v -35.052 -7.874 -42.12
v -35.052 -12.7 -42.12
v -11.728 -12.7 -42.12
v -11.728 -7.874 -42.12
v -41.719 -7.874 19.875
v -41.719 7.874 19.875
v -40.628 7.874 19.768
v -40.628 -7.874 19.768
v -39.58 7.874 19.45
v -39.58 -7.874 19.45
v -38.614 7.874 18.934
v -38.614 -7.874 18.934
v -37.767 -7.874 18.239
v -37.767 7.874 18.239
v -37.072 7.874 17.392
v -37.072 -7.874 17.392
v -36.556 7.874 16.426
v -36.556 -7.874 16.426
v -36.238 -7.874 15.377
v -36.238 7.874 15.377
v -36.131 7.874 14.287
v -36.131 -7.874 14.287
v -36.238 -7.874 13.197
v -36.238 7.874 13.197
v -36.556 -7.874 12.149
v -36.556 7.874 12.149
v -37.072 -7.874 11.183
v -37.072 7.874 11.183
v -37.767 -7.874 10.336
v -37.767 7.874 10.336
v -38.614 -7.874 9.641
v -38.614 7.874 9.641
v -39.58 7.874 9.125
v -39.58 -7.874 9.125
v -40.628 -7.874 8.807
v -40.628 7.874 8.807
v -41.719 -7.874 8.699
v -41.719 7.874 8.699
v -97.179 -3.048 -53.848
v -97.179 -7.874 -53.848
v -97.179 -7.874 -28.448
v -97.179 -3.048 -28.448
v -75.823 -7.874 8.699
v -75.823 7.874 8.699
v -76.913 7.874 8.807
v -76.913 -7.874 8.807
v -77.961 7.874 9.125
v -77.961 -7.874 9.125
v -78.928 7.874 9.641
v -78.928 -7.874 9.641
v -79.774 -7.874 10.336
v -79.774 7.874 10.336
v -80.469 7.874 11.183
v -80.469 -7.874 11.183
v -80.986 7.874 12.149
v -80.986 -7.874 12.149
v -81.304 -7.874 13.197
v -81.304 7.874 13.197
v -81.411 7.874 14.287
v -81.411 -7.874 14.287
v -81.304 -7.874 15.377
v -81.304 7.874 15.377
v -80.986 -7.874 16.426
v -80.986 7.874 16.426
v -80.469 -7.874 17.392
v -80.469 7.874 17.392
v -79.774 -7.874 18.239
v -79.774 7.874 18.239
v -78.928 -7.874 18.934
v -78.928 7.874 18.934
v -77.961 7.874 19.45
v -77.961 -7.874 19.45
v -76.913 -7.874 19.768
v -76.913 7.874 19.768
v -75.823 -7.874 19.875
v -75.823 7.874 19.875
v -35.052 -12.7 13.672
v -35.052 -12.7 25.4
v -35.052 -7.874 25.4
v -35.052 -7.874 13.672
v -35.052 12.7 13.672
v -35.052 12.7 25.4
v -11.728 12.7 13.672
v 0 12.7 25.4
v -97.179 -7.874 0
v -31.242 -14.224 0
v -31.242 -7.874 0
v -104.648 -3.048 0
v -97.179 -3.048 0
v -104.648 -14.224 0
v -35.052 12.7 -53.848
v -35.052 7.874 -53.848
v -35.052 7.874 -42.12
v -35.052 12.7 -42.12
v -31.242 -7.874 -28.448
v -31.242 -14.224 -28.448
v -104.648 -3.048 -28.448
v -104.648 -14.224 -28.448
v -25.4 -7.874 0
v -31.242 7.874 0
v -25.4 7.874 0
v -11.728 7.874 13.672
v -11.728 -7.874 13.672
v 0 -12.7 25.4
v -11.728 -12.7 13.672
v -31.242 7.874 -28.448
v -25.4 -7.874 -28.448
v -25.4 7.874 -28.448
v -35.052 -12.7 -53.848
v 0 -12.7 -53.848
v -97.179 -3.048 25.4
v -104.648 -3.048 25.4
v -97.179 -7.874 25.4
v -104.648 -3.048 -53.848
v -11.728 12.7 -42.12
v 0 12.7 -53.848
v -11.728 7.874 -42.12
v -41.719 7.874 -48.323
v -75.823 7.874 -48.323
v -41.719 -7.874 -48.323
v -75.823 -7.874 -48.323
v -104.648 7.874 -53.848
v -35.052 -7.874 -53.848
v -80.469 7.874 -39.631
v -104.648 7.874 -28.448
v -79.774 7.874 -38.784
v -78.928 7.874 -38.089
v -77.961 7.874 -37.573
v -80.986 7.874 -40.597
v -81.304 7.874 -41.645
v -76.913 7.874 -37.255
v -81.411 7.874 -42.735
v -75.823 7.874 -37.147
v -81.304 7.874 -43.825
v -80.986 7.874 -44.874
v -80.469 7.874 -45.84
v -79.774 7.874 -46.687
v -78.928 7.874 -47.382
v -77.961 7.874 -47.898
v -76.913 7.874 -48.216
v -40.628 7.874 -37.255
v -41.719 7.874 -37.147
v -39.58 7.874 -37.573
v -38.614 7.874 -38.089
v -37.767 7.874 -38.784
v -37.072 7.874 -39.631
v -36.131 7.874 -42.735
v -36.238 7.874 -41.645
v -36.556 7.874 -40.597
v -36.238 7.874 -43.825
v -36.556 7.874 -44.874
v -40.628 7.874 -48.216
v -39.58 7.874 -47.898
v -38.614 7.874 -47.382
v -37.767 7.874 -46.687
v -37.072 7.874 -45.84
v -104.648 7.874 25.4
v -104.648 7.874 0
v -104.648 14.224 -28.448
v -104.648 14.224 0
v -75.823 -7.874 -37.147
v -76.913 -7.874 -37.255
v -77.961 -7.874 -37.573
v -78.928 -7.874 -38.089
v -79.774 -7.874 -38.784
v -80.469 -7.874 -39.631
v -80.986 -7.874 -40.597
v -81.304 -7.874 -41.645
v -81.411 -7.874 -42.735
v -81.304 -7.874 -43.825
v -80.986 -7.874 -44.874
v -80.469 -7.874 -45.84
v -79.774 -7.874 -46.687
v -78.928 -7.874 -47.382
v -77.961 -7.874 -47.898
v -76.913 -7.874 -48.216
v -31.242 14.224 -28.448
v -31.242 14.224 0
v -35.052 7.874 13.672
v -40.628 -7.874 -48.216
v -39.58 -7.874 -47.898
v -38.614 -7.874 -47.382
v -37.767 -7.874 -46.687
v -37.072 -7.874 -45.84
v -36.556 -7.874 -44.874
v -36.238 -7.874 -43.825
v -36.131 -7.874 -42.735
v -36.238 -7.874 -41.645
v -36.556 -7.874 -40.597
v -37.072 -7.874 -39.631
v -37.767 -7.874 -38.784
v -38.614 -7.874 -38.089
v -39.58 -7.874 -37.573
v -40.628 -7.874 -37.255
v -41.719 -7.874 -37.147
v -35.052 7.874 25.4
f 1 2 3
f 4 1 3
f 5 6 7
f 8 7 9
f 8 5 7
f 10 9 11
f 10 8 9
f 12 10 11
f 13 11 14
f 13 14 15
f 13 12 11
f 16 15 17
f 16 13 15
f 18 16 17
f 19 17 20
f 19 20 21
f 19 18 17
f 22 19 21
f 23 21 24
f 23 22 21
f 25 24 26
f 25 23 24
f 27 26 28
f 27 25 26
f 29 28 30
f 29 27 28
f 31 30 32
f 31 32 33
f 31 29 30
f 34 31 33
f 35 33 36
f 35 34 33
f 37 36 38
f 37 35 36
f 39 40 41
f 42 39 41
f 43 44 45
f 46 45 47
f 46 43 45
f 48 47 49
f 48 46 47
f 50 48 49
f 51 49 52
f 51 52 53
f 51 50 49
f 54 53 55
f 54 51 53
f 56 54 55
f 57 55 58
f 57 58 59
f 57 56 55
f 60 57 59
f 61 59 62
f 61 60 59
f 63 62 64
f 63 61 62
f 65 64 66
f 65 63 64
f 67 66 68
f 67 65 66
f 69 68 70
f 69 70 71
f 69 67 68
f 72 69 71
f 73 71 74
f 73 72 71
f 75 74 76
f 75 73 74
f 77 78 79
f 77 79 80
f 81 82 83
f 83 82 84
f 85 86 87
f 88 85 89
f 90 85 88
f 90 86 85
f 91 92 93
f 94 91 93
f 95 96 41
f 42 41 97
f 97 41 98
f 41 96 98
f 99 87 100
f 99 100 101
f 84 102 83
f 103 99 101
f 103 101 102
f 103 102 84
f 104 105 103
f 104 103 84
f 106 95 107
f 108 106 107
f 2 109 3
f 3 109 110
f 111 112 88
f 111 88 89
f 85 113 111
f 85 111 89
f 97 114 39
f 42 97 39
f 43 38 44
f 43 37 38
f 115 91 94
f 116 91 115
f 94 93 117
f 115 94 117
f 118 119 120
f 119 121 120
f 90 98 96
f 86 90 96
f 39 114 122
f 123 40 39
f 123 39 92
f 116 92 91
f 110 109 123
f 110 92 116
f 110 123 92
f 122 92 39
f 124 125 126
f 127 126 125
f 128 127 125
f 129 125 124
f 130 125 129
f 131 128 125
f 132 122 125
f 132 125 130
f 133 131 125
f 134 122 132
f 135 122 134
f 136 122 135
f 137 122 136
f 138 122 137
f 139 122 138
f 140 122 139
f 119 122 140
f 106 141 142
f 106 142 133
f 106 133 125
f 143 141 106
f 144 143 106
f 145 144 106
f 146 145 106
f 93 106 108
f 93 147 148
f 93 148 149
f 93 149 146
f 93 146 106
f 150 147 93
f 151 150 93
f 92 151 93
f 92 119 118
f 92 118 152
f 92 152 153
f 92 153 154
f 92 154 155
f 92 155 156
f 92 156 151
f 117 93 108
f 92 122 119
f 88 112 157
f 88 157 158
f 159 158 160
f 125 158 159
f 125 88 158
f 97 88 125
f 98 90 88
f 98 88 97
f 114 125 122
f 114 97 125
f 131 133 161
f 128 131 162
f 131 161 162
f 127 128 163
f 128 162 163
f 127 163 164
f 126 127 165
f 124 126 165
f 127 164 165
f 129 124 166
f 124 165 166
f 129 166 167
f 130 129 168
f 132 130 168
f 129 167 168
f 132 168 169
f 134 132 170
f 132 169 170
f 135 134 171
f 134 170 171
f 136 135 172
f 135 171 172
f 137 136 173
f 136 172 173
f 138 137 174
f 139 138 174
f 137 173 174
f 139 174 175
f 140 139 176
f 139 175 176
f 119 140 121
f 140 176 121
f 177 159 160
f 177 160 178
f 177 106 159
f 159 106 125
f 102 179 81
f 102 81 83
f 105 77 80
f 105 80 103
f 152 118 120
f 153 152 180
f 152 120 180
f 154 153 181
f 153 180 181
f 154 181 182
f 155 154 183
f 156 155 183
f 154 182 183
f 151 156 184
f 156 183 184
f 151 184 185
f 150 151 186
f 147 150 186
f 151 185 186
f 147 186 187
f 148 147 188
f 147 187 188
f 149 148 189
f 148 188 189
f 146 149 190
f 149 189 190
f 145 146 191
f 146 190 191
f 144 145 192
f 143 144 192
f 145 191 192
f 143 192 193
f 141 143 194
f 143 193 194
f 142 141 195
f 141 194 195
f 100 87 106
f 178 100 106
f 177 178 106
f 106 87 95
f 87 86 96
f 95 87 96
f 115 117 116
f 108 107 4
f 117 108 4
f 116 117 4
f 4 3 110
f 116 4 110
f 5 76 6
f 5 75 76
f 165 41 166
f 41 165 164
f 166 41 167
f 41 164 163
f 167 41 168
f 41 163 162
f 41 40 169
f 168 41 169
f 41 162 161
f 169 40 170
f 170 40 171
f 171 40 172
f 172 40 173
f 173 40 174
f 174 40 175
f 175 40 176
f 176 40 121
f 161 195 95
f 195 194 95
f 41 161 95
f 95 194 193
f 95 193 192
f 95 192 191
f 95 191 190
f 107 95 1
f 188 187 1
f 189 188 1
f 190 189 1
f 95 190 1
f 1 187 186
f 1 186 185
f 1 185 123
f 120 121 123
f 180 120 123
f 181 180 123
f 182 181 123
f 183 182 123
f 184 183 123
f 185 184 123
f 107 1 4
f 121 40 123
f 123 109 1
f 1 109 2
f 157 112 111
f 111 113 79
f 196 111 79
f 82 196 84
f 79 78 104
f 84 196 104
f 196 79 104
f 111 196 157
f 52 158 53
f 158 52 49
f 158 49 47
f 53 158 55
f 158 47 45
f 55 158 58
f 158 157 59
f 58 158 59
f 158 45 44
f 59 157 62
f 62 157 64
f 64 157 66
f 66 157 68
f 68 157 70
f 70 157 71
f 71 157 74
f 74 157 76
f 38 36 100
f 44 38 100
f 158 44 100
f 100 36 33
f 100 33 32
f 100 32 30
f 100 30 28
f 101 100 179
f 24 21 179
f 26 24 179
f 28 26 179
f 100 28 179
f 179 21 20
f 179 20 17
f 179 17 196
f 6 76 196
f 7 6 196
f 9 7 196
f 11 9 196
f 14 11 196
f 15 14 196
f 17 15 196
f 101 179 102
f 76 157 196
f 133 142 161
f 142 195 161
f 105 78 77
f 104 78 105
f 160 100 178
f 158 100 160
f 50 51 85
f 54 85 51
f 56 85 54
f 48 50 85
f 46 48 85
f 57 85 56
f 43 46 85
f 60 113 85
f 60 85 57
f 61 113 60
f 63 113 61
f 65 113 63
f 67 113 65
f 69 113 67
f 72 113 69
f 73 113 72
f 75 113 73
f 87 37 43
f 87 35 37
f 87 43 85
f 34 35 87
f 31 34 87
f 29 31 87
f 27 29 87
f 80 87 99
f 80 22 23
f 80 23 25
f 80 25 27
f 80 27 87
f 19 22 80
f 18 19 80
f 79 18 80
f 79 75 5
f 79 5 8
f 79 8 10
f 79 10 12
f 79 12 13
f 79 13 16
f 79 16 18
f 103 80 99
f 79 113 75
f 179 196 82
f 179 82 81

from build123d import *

# Parameters (mm, degrees)
F1_DEPTH      = 14.224
F2_DEPTH      = 7.874
F3_DEPTH      = 12.7
F0_W          = 7.468818
F0_H          = 25.4
F4_DEPTH      = 3.048
F4_DEPTH_BACK = 7.874


with BuildPart() as f1:
    # F0 (on Front) → F1 (new body, symmetric)
    with BuildSketch(Plane.XZ):
        Polygon((-31.242, -14.224), (-31.242, 0), (-97.179182, 0), (-104.648, 0), (-104.648, -14.224), align=None)
    extrude(amount=F1_DEPTH, both=True)

    # F0 (on Front) → F2 (join, symmetric)
    with BuildSketch(Plane.XZ):
        Polygon((-31.242, 0), (-25.4, 0), (-11.728174, 13.671826), (-35.052, 13.671826), (-35.052, 25.4), (-75.822987, 25.4), (-97.179182, 25.4), (-97.179182, 0), align=None)
        with BuildLine():
            ThreePointArc((-75.822987, 8.69926), (-81.410987, 14.28726), (-75.822987, 19.87526))
            Line((-75.822987, 19.87526), (-41.718637, 19.87526))
            ThreePointArc((-41.718637, 19.87526), (-36.130637, 14.28726), (-41.718637, 8.69926))
            Line((-41.718637, 8.69926), (-75.822987, 8.69926))
        make_face(mode=Mode.SUBTRACT)
    extrude(amount=F2_DEPTH, both=True)

    # F0 (on Front) → F3 (join, symmetric)
    with BuildSketch(Plane.XZ):
        Polygon((-35.052, 13.671826), (-11.728174, 13.671826), (0, 25.4), (-35.052, 25.4), align=None)
    extrude(amount=F3_DEPTH, both=True)

    # F0 (on Front) → F4 (join, two sides)
    with BuildSketch(Plane.XZ) as f4_sk:
        with Locations((-100.913591, 12.7)):
            Rectangle(F0_W, F0_H)
    extrude(amount=F4_DEPTH)
    extrude(f4_sk.sketch, amount=-F4_DEPTH_BACK)

    # F5: F1 across face


with BuildPart() as f1_1:
    add(f1.part)
    add(f1.part.mirror(Plane(origin=(-67.945, 0, -14.224), x_dir=(1, 0, 0), z_dir=(0, 0, -1))))


solid = f1_1.part
